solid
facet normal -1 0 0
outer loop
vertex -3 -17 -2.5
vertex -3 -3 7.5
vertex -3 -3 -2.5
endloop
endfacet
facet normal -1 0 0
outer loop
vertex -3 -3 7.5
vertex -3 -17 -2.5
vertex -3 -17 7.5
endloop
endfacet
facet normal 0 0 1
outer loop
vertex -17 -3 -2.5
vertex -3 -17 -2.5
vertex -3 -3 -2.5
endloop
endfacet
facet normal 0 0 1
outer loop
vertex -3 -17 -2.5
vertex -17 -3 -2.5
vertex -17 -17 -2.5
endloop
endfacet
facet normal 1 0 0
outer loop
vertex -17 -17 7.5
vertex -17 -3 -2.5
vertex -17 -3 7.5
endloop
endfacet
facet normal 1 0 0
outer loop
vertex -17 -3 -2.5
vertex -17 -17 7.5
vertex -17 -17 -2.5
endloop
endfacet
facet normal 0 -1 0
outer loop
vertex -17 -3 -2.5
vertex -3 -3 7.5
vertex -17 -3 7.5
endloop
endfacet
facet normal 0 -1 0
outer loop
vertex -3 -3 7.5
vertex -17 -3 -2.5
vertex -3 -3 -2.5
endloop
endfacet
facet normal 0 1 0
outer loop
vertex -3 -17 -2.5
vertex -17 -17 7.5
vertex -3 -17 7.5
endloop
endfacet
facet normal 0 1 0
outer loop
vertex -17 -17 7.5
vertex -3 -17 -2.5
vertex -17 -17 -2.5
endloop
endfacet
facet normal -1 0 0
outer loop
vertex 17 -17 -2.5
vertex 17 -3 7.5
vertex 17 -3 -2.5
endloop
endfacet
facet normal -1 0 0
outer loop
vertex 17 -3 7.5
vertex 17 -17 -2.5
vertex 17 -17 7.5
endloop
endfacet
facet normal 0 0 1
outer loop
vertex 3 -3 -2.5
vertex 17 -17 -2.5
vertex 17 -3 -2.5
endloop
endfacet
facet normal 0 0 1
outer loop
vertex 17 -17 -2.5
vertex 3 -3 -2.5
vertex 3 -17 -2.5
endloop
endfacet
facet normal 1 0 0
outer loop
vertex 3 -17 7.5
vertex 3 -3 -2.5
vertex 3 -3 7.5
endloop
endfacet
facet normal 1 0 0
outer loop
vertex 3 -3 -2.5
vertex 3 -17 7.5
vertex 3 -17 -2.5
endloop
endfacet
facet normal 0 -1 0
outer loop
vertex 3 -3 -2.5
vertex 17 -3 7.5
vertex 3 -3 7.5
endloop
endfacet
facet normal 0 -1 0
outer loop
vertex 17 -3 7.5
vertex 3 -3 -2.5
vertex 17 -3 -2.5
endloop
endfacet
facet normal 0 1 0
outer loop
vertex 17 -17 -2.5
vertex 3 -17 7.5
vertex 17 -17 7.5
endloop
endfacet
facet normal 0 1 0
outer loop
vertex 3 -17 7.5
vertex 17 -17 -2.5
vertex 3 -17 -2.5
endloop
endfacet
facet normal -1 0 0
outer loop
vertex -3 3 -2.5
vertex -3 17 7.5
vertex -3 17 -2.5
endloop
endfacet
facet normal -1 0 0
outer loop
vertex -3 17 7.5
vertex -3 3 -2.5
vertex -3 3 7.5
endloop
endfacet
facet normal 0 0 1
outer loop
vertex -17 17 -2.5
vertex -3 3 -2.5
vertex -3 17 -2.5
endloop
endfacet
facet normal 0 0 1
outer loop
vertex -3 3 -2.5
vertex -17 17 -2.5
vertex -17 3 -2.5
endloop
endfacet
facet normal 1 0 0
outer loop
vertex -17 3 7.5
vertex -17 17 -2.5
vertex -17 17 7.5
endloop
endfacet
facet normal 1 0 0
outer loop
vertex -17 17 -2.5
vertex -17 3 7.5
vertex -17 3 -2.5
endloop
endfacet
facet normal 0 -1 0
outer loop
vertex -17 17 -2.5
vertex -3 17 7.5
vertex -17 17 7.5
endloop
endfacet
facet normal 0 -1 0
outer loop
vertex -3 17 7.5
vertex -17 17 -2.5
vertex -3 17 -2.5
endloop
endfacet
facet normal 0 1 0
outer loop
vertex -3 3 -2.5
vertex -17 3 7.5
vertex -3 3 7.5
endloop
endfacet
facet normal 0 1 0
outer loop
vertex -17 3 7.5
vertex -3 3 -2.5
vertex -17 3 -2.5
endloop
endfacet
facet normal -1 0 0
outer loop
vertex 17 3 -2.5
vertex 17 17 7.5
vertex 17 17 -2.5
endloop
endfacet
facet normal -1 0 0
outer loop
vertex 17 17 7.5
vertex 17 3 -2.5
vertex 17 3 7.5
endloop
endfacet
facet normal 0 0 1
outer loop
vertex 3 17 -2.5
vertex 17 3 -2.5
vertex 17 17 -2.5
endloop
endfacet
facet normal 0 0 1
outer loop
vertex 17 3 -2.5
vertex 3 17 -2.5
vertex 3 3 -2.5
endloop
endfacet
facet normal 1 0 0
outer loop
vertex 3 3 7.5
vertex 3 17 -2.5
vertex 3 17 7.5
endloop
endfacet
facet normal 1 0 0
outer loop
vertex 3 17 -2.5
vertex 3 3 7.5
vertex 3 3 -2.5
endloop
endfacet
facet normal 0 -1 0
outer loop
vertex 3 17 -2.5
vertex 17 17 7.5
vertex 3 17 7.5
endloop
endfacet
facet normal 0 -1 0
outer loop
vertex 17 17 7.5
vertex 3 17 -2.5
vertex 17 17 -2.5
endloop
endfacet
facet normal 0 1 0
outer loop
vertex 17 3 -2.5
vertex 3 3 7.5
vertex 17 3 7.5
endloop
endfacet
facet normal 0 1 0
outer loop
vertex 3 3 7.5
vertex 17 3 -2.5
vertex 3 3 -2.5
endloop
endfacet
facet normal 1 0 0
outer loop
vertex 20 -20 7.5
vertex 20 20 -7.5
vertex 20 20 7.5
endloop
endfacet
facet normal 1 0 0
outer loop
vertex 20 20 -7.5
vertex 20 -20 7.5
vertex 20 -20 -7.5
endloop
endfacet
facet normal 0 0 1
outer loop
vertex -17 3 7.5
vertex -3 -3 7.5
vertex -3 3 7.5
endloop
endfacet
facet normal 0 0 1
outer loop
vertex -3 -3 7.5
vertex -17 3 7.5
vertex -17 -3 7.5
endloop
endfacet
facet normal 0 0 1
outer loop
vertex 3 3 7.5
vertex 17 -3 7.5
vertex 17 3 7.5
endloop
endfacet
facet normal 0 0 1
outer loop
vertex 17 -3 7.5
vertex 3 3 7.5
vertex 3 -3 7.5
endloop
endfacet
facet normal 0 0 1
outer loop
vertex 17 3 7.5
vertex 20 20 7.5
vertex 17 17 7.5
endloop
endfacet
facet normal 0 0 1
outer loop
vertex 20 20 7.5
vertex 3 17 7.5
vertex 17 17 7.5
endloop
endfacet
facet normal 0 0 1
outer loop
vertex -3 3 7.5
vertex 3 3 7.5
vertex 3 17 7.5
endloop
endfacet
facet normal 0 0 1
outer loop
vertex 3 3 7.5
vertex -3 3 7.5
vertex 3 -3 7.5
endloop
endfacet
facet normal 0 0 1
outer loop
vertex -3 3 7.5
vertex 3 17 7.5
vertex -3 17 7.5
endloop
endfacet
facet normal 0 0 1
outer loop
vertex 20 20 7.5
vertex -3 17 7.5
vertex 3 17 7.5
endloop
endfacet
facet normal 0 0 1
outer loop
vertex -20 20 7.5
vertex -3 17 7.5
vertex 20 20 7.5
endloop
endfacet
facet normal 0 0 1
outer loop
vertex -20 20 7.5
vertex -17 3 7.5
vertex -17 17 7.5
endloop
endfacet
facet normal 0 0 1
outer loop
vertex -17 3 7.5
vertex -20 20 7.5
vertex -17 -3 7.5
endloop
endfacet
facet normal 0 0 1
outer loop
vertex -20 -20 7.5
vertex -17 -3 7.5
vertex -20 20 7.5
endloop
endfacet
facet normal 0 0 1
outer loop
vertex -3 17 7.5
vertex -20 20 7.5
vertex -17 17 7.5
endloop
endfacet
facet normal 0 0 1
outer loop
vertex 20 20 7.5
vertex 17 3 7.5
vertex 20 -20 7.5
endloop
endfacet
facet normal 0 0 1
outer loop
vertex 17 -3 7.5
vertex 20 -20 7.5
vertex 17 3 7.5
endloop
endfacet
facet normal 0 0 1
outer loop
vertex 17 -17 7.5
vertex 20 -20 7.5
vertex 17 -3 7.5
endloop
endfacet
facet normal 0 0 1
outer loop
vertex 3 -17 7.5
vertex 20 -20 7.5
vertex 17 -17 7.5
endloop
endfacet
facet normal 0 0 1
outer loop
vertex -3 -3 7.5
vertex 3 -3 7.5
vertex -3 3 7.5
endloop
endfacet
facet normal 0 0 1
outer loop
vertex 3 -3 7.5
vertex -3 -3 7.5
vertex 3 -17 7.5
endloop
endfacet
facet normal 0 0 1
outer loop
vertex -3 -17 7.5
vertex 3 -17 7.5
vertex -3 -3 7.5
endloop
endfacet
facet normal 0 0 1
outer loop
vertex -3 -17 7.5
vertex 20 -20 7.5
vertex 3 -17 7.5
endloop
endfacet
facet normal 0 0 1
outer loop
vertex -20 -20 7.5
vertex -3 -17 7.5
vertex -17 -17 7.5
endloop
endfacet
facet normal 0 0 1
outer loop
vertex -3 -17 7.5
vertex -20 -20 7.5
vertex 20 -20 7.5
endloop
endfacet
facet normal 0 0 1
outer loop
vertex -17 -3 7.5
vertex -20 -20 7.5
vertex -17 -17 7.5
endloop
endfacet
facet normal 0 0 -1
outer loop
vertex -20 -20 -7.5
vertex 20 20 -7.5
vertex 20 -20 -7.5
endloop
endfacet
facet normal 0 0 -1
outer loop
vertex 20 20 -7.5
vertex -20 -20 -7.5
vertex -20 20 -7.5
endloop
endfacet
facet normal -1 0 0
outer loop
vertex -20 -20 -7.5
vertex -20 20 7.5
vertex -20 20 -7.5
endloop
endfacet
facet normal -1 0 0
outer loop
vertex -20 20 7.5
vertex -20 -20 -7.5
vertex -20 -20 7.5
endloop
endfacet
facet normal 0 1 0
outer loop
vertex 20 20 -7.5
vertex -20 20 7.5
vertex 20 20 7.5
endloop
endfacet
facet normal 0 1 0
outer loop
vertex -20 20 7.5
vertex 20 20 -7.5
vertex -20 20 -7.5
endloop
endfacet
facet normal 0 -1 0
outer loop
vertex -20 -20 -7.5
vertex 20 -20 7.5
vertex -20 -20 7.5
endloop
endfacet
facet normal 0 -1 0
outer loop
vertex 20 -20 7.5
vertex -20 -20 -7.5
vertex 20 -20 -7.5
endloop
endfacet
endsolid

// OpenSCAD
$fn = 32;

// ----------------------------------------------------------------------
// Pocket plate 40 x 40 x 15
// 2 x 2 pockets 14 mm square, 10 mm deep
// ----------------------------------------------------------------------

// --- parameters (mm) ---
thickness = 15;  // plate thickness
floor_t = 5;     // material left under each pocket
pocket = 14;     // pocket side length
pitch_x = 20;    // pocket pitch along X
pitch_y = 20;    // pocket pitch along Y
cols = 2;        // pockets per row
rows = 2;        // rows of pockets

// --- derived feature positions (mm) ---
depth = thickness - floor_t;        // = 10   pocket depth, down to the floor
span_x = (cols - 1) * pitch_x;      // = 20   distance between outer pockets
span_y = (rows - 1) * pitch_y;      // = 20   distance between outer pocket rows
origin_x = -span_x / 2;             // = -10   X of the first pocket
origin_y = -span_y / 2;             // = -10   Y of the first pocket
plate = [span_x + pocket + 6, span_y + pocket + 6, thickness];  // = [40, 40, 15]   overall size: pockets plus 3 mm of wall on each side
feature_centers = [
  [origin_x + 0 * pitch_x, origin_y + 0 * pitch_y],
  [origin_x + 1 * pitch_x, origin_y + 0 * pitch_y],
  [origin_x + 0 * pitch_x, origin_y + 1 * pitch_y],
  [origin_x + 1 * pitch_x, origin_y + 1 * pitch_y]
];   // pocket centres, used verbatim by the cutter loop

// plate outline, then one pocket per centre in feature_centers
difference() {
  cube(plate, center = true);
  for (centre = feature_centers)
    translate([centre[0] - pocket / 2, centre[1] - pocket / 2, plate[2] / 2 - depth])
      cube([pocket, pocket, depth + 1]);  // centred on the declared pocket centre
}
